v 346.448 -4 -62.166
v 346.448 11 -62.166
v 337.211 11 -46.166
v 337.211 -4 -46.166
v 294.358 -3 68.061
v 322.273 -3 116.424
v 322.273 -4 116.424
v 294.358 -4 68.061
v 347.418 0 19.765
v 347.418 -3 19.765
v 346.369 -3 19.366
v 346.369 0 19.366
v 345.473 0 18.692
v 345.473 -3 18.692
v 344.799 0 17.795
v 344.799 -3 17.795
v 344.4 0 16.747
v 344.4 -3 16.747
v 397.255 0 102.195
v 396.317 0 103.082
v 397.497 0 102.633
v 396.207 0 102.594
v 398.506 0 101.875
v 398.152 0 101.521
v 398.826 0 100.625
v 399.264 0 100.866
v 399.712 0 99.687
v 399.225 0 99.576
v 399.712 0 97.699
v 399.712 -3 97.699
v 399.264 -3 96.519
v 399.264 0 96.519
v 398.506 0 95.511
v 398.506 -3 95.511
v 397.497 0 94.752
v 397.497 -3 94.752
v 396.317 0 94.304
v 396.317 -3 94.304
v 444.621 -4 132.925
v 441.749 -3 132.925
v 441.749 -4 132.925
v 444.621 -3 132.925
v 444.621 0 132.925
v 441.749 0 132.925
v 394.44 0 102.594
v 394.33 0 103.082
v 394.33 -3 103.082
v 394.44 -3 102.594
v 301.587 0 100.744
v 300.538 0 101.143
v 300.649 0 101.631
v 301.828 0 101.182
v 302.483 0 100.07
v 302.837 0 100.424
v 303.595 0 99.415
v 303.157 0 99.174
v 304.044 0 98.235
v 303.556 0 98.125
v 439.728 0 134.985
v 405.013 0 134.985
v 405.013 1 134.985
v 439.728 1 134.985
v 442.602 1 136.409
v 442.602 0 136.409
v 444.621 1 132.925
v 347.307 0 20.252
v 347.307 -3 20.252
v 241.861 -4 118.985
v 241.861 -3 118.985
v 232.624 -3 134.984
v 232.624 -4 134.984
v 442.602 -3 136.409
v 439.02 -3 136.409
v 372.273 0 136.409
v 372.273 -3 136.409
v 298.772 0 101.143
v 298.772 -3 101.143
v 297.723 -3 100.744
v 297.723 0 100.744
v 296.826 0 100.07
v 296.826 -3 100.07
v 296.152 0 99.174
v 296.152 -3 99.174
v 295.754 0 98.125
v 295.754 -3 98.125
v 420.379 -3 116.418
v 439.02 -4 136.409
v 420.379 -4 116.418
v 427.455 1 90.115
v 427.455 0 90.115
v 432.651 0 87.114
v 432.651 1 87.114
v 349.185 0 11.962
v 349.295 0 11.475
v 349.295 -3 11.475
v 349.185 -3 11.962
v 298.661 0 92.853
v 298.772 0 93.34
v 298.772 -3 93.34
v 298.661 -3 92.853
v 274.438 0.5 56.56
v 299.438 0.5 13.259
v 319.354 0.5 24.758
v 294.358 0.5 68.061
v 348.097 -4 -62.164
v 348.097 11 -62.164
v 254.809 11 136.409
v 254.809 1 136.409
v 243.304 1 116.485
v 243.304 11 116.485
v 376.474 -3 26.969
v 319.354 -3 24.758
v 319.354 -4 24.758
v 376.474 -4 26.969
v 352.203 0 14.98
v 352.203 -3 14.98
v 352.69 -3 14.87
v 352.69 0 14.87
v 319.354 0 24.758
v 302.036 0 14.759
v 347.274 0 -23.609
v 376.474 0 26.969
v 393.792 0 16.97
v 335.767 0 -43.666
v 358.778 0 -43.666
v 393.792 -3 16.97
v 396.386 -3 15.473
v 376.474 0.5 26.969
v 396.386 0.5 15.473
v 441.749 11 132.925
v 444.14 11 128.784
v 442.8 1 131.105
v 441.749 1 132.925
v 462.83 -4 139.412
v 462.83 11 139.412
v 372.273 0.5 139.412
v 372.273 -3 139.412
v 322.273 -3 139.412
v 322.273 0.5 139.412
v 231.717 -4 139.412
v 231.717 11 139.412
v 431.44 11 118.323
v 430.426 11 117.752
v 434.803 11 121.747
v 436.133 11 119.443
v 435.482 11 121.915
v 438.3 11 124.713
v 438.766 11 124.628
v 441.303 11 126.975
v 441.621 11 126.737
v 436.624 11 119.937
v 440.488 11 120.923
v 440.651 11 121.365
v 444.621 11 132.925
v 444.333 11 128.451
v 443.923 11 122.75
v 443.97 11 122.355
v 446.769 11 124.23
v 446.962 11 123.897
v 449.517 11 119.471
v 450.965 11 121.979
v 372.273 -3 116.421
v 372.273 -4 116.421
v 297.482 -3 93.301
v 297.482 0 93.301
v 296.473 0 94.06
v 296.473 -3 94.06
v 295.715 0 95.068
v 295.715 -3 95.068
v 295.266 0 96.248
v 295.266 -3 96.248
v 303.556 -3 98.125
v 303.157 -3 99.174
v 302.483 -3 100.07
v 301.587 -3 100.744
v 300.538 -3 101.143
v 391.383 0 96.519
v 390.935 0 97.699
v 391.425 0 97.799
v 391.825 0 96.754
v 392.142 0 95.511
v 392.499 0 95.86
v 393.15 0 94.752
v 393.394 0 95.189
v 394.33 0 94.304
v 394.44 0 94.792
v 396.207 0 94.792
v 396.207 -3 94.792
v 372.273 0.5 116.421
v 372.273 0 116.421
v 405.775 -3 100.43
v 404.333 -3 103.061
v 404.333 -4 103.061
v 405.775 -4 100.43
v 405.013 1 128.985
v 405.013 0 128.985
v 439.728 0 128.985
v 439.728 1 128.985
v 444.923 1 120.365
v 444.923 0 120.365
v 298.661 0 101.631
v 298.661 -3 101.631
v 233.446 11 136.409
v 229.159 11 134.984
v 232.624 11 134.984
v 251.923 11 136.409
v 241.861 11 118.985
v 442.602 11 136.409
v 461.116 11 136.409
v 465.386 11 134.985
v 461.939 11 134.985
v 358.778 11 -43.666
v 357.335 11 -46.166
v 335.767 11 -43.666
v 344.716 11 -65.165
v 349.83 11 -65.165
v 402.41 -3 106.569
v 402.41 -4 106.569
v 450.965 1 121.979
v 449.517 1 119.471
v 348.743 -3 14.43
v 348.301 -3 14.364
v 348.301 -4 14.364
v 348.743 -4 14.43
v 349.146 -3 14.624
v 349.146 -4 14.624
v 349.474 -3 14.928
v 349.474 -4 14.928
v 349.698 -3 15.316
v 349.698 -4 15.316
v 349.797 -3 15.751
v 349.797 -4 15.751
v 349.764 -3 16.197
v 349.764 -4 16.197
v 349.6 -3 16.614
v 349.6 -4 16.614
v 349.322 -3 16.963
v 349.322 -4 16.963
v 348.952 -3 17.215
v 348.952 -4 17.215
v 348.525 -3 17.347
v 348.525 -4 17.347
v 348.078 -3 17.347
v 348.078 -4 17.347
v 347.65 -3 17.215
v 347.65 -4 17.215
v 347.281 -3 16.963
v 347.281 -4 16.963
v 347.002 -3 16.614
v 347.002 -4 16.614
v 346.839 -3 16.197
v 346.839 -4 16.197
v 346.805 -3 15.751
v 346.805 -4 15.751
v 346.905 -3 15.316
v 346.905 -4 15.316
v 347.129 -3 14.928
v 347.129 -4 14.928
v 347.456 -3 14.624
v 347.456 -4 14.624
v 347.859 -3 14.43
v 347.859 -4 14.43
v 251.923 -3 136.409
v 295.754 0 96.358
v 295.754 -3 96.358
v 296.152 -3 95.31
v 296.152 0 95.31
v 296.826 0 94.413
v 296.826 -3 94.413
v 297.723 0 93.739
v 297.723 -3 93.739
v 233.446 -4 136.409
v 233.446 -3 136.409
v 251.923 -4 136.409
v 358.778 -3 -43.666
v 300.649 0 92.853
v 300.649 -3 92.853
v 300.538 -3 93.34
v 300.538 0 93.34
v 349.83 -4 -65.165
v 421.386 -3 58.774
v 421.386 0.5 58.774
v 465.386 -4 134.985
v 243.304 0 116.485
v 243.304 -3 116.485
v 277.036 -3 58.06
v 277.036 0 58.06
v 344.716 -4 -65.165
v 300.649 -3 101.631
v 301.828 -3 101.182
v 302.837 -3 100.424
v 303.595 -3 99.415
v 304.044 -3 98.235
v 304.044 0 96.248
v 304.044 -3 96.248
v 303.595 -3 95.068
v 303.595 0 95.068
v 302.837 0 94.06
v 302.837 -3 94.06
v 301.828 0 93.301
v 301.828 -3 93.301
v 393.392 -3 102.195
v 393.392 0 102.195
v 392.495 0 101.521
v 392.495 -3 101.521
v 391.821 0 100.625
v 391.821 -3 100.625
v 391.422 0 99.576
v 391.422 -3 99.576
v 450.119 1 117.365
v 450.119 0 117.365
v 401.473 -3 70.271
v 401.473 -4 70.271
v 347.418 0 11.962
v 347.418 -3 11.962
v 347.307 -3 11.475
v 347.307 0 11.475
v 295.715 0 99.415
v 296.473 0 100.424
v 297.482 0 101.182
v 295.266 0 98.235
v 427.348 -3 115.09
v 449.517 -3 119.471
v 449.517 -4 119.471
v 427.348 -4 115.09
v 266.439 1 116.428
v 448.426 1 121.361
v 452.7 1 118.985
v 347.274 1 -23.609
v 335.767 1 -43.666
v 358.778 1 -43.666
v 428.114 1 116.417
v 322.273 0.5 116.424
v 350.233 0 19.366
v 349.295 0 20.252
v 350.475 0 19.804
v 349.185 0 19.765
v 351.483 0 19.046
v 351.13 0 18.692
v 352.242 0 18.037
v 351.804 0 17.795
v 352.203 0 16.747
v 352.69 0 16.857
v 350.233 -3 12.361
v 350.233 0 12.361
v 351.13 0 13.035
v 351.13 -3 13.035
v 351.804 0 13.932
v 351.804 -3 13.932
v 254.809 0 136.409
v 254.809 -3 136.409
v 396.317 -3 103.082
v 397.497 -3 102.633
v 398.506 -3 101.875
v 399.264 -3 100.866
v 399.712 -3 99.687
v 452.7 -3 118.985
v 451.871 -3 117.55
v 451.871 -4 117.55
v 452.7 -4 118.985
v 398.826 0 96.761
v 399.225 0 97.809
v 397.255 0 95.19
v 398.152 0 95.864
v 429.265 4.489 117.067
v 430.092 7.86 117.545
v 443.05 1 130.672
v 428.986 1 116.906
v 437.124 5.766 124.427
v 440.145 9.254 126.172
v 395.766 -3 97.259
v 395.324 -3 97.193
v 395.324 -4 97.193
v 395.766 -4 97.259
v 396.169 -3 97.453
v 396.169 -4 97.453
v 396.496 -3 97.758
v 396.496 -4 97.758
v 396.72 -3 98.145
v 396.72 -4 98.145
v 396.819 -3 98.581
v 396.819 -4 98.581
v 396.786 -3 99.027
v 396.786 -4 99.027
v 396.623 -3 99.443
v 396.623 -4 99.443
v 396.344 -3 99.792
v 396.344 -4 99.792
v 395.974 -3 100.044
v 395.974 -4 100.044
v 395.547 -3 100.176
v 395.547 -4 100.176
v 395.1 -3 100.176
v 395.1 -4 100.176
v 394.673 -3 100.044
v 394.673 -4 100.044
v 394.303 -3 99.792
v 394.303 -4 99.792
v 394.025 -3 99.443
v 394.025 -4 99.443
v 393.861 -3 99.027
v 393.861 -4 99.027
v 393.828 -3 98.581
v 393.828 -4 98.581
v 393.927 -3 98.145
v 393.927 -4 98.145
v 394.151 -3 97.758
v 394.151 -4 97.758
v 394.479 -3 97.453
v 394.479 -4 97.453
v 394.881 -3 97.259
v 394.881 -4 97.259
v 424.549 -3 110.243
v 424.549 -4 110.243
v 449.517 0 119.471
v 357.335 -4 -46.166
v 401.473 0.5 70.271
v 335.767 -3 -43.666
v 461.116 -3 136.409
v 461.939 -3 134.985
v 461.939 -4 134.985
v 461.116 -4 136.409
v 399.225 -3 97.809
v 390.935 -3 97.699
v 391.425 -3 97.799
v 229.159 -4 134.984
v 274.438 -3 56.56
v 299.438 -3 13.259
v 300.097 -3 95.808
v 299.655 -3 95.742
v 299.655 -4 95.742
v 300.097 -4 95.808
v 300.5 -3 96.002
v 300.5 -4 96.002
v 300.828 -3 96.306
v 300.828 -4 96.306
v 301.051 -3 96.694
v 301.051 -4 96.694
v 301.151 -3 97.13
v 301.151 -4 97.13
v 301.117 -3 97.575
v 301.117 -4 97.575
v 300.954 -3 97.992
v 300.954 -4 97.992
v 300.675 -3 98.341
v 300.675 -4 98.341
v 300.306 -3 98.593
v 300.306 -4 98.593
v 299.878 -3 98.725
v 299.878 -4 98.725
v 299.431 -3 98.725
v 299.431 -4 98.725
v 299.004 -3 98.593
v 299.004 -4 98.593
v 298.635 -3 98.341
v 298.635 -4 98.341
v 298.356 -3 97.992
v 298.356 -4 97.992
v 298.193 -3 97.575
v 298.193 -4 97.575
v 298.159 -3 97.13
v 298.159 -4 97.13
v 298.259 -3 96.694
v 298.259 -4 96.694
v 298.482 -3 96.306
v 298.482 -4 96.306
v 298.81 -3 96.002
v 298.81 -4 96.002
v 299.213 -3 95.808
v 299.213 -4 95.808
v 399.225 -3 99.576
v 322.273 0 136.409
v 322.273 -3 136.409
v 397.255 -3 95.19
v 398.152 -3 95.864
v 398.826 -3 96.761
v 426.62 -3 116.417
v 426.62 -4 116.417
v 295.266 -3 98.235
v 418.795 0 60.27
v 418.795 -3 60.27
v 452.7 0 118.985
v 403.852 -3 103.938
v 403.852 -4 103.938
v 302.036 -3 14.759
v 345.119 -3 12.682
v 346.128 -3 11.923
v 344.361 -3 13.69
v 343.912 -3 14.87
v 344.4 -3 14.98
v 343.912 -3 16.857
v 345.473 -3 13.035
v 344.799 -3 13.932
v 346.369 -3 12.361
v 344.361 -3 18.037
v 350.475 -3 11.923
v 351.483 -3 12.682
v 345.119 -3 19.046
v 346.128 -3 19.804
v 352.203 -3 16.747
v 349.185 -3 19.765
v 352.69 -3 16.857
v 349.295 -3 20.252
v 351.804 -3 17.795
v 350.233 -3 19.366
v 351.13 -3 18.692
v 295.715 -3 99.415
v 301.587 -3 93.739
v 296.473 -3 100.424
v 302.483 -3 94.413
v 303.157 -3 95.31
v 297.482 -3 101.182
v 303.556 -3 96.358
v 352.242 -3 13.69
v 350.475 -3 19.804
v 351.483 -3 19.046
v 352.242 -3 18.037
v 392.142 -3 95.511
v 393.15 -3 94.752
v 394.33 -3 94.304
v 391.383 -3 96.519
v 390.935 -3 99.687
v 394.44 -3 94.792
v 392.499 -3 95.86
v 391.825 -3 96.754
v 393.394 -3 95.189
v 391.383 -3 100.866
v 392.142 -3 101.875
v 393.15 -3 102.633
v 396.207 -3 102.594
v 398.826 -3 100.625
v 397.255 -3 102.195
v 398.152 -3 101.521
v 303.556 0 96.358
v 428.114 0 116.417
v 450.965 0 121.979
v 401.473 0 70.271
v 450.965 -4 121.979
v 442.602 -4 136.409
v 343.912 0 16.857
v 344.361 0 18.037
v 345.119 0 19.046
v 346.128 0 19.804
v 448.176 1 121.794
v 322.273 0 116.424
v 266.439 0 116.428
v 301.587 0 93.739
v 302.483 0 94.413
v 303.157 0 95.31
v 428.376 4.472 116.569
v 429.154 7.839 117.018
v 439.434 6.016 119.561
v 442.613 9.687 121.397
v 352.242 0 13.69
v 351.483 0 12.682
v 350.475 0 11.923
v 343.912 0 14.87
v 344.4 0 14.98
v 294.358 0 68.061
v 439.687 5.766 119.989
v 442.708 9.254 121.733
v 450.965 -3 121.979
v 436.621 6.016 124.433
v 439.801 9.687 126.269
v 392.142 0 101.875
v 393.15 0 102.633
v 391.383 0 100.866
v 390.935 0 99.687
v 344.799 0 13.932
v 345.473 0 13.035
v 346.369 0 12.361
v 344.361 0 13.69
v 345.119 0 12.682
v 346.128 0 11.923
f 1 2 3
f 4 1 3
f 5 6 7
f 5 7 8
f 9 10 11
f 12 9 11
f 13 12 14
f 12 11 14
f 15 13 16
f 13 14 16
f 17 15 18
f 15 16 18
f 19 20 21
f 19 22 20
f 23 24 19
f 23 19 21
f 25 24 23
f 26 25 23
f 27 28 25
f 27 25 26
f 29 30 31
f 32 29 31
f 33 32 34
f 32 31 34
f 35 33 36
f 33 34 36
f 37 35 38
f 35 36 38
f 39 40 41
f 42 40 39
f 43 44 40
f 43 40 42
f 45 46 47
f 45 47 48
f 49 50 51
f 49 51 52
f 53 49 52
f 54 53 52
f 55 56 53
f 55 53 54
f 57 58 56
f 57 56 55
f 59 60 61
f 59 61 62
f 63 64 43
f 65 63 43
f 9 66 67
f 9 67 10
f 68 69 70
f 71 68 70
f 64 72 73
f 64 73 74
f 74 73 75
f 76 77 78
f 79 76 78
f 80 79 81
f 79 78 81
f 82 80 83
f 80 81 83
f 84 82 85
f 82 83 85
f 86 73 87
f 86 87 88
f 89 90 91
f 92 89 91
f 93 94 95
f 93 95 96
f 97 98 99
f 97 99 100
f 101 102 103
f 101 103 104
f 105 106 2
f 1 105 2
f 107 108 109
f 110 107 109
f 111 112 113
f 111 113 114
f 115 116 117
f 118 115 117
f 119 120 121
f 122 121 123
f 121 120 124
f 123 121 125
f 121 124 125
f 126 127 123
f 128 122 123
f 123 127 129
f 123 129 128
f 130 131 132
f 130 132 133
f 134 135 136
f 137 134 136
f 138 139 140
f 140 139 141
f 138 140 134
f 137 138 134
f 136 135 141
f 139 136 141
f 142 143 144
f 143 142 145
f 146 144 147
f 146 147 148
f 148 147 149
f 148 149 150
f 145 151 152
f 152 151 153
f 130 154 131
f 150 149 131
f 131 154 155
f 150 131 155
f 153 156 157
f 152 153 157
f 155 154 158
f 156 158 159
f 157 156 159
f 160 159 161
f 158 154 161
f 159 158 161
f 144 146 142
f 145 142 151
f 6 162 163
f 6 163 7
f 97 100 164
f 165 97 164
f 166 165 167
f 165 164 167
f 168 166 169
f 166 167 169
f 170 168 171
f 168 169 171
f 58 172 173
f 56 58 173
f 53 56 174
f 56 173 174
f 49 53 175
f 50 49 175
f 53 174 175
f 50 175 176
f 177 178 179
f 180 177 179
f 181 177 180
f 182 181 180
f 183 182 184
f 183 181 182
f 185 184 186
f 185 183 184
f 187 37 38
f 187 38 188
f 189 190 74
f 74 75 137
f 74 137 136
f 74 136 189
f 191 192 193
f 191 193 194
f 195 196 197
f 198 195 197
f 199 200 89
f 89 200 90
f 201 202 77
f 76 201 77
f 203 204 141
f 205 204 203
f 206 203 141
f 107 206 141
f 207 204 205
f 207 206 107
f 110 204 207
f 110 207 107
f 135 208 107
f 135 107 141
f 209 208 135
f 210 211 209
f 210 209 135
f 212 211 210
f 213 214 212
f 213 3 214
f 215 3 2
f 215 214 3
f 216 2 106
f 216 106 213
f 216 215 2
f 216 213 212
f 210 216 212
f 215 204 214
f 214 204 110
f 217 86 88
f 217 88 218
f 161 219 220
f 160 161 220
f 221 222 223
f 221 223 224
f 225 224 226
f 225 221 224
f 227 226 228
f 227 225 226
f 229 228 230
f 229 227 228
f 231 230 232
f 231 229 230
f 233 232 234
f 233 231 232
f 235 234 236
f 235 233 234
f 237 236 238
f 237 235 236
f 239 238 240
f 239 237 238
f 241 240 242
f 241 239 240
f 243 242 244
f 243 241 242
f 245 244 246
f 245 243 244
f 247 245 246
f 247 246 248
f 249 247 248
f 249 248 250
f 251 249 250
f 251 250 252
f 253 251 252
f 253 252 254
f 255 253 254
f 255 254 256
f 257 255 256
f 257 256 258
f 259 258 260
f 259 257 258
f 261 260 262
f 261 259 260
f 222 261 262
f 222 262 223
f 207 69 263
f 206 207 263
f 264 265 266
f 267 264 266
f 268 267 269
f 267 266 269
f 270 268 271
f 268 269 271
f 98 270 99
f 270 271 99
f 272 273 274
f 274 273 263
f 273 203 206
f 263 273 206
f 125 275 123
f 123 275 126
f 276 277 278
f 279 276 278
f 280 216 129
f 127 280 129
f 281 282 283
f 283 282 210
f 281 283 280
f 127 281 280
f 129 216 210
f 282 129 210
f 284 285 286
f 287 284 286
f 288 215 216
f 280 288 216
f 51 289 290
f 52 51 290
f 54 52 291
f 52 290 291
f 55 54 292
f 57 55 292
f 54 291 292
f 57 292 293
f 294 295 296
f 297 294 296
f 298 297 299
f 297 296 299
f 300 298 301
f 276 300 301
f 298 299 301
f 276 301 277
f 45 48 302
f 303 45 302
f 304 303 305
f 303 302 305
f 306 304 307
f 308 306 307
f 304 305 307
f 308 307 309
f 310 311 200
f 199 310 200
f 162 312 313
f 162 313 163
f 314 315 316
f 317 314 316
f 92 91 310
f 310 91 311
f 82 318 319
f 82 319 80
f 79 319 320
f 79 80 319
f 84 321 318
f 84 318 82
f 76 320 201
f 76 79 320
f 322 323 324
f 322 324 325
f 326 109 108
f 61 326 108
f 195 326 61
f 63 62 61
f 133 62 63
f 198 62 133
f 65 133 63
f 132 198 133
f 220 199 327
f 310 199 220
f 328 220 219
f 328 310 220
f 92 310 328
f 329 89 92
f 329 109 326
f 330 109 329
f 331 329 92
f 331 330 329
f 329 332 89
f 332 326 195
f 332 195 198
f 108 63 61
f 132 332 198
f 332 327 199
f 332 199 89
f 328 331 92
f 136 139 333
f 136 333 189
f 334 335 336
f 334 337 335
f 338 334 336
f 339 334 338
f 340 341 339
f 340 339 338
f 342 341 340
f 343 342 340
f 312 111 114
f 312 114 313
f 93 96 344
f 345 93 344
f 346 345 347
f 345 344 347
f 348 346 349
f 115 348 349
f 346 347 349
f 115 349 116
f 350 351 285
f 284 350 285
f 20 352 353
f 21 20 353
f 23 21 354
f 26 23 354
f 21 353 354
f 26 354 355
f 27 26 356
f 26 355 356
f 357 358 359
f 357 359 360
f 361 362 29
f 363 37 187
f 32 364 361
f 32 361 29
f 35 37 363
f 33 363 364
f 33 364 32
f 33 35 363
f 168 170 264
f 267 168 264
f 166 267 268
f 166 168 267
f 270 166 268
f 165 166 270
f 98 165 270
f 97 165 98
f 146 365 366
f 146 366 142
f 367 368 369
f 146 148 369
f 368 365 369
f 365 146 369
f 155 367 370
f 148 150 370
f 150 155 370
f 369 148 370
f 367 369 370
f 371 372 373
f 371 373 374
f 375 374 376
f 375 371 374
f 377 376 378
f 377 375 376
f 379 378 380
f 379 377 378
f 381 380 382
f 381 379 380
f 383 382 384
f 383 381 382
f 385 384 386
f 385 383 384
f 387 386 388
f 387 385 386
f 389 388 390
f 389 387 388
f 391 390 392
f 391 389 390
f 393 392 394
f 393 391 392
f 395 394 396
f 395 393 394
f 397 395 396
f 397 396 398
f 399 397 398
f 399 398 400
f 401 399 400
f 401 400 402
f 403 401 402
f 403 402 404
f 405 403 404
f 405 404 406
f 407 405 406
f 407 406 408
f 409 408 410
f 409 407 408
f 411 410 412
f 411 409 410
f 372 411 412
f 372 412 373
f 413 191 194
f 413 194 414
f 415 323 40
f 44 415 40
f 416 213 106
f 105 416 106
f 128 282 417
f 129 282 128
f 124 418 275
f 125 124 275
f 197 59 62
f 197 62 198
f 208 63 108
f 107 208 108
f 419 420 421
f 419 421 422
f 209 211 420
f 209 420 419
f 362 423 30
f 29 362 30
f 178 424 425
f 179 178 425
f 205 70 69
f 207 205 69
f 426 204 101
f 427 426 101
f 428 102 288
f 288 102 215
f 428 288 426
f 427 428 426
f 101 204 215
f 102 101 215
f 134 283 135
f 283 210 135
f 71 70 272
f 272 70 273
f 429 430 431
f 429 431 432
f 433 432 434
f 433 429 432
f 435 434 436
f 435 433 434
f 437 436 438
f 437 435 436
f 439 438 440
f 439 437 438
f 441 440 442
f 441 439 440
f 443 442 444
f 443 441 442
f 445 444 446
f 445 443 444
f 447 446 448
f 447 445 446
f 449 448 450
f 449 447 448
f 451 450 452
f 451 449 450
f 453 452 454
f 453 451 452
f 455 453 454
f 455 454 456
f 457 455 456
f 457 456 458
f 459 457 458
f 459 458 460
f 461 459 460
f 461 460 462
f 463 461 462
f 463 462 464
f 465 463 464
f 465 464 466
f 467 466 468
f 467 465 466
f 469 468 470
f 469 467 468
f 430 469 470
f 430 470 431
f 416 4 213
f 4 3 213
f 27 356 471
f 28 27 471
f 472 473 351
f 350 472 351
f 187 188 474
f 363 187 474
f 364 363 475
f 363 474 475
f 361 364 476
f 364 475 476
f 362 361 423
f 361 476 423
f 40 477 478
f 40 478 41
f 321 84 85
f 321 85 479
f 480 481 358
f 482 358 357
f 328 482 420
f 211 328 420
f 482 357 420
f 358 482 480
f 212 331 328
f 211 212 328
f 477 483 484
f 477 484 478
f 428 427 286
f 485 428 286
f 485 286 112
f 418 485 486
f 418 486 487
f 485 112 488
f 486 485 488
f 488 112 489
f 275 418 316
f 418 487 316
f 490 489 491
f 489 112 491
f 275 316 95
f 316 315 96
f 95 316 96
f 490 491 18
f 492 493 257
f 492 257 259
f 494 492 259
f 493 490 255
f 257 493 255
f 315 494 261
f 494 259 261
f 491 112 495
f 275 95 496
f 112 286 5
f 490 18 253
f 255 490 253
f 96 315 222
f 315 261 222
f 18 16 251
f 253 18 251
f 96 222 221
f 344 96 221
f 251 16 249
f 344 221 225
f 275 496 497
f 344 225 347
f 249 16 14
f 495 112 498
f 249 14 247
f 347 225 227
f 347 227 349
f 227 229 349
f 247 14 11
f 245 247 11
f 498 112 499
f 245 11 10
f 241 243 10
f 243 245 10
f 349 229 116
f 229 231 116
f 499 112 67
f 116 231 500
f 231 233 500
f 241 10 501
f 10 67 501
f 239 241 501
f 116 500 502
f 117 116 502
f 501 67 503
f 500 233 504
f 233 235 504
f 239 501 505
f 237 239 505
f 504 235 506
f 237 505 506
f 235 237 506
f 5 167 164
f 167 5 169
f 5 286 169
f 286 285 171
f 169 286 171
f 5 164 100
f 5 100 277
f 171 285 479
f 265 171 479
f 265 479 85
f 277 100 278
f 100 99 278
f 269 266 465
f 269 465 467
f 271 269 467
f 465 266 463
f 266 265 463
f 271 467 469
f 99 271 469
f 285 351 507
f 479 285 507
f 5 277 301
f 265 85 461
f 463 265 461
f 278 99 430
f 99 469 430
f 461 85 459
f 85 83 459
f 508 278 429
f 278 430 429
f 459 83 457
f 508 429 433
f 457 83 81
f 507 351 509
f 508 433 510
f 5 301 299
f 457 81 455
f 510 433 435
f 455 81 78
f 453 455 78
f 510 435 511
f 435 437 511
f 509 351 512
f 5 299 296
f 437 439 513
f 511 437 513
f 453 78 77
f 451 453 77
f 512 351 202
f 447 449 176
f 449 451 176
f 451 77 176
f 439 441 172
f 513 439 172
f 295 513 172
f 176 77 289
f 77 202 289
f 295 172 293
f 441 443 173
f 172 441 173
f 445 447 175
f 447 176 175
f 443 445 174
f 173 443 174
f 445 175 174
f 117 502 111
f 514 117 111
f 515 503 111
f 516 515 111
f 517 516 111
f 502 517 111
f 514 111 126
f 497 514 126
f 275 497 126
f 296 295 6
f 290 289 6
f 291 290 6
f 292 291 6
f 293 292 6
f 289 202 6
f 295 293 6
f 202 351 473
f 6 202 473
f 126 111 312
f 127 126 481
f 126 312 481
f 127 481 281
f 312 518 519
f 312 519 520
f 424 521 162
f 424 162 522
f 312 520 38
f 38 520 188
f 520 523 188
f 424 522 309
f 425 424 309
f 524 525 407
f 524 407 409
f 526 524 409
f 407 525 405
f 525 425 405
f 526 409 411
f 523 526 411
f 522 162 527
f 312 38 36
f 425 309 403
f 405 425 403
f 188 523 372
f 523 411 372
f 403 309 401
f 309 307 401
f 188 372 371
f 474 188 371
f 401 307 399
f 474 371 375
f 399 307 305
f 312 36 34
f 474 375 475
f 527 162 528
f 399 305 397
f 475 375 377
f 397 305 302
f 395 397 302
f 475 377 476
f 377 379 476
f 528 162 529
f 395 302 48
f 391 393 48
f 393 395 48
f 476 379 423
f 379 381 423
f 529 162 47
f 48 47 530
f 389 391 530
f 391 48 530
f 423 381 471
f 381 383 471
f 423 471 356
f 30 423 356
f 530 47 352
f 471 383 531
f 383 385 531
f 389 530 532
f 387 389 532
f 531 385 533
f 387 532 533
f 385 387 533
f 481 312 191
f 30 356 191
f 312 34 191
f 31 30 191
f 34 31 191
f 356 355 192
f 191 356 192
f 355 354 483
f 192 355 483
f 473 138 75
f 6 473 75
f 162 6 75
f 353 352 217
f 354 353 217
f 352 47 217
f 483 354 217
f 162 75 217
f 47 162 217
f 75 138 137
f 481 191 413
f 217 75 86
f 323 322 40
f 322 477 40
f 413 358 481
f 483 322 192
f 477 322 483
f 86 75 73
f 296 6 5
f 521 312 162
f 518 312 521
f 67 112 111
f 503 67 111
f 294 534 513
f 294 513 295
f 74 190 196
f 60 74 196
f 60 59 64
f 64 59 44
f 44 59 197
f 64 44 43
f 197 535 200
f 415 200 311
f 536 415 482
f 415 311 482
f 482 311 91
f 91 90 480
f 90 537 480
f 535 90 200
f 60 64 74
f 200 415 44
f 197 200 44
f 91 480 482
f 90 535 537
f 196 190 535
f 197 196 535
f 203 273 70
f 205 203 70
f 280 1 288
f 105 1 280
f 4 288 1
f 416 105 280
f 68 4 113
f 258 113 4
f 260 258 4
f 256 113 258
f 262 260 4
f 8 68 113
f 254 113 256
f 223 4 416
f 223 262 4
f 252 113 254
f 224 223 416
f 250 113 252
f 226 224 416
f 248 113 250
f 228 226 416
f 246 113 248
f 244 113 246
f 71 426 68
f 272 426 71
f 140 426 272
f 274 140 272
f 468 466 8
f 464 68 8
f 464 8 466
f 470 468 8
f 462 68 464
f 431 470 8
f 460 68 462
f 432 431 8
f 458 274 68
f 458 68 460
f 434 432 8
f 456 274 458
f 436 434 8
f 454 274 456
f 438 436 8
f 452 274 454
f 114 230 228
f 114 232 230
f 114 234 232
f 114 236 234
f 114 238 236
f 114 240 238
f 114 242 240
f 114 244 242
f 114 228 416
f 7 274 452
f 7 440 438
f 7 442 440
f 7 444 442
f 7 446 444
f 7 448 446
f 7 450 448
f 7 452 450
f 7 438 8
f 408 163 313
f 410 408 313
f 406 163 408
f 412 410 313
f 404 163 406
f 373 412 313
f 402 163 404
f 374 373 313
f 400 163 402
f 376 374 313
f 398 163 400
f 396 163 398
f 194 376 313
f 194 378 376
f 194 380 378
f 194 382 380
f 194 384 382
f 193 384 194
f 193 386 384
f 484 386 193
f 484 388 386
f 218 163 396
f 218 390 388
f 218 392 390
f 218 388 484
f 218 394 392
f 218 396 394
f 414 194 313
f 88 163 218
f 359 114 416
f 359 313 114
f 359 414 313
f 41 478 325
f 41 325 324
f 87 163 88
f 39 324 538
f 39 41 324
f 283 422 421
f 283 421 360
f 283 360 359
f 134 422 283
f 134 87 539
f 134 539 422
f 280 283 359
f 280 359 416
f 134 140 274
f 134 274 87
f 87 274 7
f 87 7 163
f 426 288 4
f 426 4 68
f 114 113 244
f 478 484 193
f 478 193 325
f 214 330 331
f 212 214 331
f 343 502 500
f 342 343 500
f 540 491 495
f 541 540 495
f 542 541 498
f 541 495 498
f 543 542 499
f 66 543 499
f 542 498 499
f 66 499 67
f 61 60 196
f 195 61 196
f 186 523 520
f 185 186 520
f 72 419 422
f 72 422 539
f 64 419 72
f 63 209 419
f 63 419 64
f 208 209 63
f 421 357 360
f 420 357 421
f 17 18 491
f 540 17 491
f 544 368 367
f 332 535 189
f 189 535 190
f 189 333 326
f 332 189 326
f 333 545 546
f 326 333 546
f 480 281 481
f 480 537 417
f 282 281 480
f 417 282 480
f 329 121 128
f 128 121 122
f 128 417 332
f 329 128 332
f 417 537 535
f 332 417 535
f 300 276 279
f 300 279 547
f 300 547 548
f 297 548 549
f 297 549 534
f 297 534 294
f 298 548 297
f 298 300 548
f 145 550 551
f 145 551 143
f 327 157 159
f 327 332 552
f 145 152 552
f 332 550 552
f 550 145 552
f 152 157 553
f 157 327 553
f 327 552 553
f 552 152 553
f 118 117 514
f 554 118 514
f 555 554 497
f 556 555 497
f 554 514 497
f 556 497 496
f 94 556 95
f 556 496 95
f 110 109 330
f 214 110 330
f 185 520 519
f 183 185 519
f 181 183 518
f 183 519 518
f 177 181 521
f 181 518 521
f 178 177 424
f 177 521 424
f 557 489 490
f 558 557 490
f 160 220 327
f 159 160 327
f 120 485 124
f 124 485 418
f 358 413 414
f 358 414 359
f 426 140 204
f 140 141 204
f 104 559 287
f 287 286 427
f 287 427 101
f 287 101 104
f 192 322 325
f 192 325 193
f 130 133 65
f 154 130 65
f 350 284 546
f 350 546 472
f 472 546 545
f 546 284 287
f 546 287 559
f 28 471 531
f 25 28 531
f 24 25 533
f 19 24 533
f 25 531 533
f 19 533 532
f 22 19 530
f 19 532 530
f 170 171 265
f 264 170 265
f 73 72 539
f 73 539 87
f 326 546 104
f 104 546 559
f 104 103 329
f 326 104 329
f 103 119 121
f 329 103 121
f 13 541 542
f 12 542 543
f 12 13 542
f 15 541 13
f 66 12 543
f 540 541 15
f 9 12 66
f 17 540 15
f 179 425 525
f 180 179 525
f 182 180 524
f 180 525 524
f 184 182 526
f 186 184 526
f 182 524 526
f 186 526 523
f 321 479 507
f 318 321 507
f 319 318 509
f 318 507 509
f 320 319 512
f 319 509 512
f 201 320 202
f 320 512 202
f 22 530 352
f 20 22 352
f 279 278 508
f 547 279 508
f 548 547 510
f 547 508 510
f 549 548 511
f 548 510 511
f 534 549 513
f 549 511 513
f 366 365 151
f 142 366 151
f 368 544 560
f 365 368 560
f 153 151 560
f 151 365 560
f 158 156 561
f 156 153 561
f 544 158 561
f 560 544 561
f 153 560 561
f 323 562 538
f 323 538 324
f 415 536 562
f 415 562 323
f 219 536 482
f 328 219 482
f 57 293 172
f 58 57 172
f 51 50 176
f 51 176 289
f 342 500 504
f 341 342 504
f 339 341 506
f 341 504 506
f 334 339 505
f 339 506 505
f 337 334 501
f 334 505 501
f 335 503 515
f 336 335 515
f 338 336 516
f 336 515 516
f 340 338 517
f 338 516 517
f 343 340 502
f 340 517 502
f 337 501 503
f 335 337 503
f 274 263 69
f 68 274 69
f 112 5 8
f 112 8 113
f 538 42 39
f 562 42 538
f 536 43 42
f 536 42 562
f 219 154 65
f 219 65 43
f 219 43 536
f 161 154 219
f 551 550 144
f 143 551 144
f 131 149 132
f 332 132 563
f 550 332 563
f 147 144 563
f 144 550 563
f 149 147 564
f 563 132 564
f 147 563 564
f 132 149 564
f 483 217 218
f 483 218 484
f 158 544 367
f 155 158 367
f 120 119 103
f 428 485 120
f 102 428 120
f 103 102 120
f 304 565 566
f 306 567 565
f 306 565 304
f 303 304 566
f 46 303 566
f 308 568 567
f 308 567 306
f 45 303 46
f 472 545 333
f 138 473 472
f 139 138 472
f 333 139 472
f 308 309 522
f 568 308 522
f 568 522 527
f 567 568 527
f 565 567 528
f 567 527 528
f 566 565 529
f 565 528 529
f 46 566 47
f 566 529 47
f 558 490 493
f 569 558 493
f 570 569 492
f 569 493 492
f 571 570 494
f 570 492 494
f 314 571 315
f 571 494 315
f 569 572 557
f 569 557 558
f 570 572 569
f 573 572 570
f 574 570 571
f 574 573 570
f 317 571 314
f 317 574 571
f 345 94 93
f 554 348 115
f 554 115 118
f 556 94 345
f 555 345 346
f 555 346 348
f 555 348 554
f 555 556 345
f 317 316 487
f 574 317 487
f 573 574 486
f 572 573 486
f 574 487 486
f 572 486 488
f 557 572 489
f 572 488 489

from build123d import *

# Parameters (mm, degrees)
SKETCH1_W                = 34.714871786
SKETCH1_H                = 6
BOSS_EXTRUDE1_DEPTH      = 1
BOSS_EXTRUDE2_DEPTH      = 11
BOSS_EXTRUDE3_DEPTH      = 5
BOSS_EXTRUDE3_DEPTH_BACK = 3
SKETCH3_W                = 50
SKETCH3_H                = 7
CUT_EXTRUDE3_DEPTH       = 25
SKETCH5_W                = 50
SKETCH5_H                = 7
CUT_EXTRUDE4_DEPTH       = 25
SKETCH6_W                = 50
SKETCH6_H                = 7
CUT_EXTRUDE5_DEPTH       = 25
SKETCH8_R                = 1.500000001
SKETCH8_R_2              = 1.499999999
BOSS_EXTRUDE5_DEPTH      = 1
BOSS_EXTRUDE10_DEPTH     = 3
REVOLVE1_ANGLE           = 90
SKETCH15_W               = 7.87412369
SKETCH15_H               = 12.308031651
CUT_EXTRUDE7_DEPTH       = 38


with BuildPart() as part:
    # Sketch1 → Boss-Extrude1 (new body)
    with BuildSketch(Plane(origin=(0, 0, 0), x_dir=(1, 0, 0), z_dir=(0, 1, 0))):
        Polygon((243.304219779, -116.484791863), (254.809280582, -136.408896135), (442.60209075, -136.409305398), (444.621046679, -132.925433226), (441.749040748, -132.925433226), (449.516726724, -119.47140646), (450.964695301, -121.978953126), (452.699916625, -118.984688022), (358.778179038, 43.666038061), (335.767496282, 43.666038061), align=None)
        with Locations((422.370878913, -131.984588005)):
            Rectangle(SKETCH1_W, SKETCH1_H, mode=Mode.SUBTRACT)
        Polygon((450.119365975, -117.364996826), (444.923425166, -120.365363323), (427.455346217, -90.114690822), (432.651287025, -87.114324326), align=None, mode=Mode.SUBTRACT)
        Polygon((428.11367092, -116.417164682), (266.43910827, -116.428009228), (347.273609731, 23.609230811), align=None, mode=Mode.SUBTRACT)
    extrude(amount=BOSS_EXTRUDE1_DEPTH)

    # Sketch1<9> → Boss-Extrude2 (add)
    # profile 1 of 2: a face of its own
    with BuildSketch(Plane(origin=(0, 0, 0), x_dir=(1, 0, 0), z_dir=(0, 1, 0))):
        Polygon((229.15943255, -134.984249185), (231.716666588, -139.412373829), (462.829865412, -139.412373829), (465.38624875, -134.984588004), (349.829542096, 65.165499075), (344.716133219, 65.165499075), align=None)
        Polygon((251.922647994, -136.409305396), (233.446303405, -136.408896135), (232.623553965, -134.984217354), (241.860901694, -118.984688016), align=None, mode=Mode.SUBTRACT)
        Polygon((442.60209075, -136.409305398), (254.809280582, -136.408896135), (243.304219779, -116.484791863), (335.767496282, 43.666038061), (358.778179038, 43.666038061), (461.938967961, -134.98458801), (461.116393749, -136.409305398), align=None, mode=Mode.SUBTRACT)
        Polygon((348.096628302, 62.164013367), (357.334800991, 46.166038067), (337.210874326, 46.166038067), (346.44844193, 62.165948237), align=None, mode=Mode.SUBTRACT)
    # profile 2 of 2: a face of its own
    with BuildSketch(Plane(origin=(0, 0, 0), x_dir=(1, 0, 0), z_dir=(0, 1, 0))):
        Polygon((441.749040748, -132.925433226), (444.621046679, -132.925433226), (450.964695301, -121.978953126), (449.516726724, -119.47140646), align=None)
    extrude(amount=BOSS_EXTRUDE2_DEPTH)

    # Sketch1<10> → Boss-Extrude3 (add, two sides: drawn at the far end of the back side and taken through both)
    # profile 1 of 2: a face of its own
    with BuildSketch(Plane(origin=(0, 0, 0), x_dir=(1, 0, 0), z_dir=(0, 1, 0)).offset(-BOSS_EXTRUDE3_DEPTH_BACK)):
        Polygon((229.15943255, -134.984249185), (231.716666588, -139.412373829), (462.829865412, -139.412373829), (465.38624875, -134.984588004), (349.829542096, 65.165499075), (344.716133219, 65.165499075), align=None)
        Polygon((251.922647994, -136.409305396), (233.446303405, -136.408896135), (232.623553965, -134.984217354), (241.860901694, -118.984688016), align=None, mode=Mode.SUBTRACT)
        Polygon((442.60209075, -136.409305398), (254.809280582, -136.408896135), (243.304219779, -116.484791863), (335.767496282, 43.666038061), (358.778179038, 43.666038061), (461.938967961, -134.98458801), (461.116393749, -136.409305398), align=None, mode=Mode.SUBTRACT)
        Polygon((348.096628302, 62.164013367), (357.334800991, 46.166038067), (337.210874326, 46.166038067), (346.44844193, 62.165948237), align=None, mode=Mode.SUBTRACT)
    # profile 2 of 2: a face of its own
    with BuildSketch(Plane(origin=(0, 0, 0), x_dir=(1, 0, 0), z_dir=(0, 1, 0)).offset(-BOSS_EXTRUDE3_DEPTH_BACK)):
        Polygon((441.749040748, -132.925433226), (444.621046679, -132.925433226), (450.964695301, -121.978953126), (449.516726724, -119.47140646), align=None)
    extrude(amount=BOSS_EXTRUDE3_DEPTH + BOSS_EXTRUDE3_DEPTH_BACK)

    # Sketch3 → Cut-Extrude3 (cut)
    with BuildSketch(Plane(origin=(290.589645397, 0, -167.772009994), x_dir=(-0.49999999999998745, 0, -0.8660254037844459), z_dir=(0.8660254037844459, 0, -0.49999999999998745))):
        with Locations((-236.592990632, -3)):
            Rectangle(SKETCH3_W, SKETCH3_H)
    extrude(amount=-CUT_EXTRUDE3_DEPTH, mode=Mode.SUBTRACT)

    # Sketch5 → Cut-Extrude4 (cut)
    with BuildSketch(Plane.XY.offset(139.412373829)):
        with Locations((347.273266, -3)):
            Rectangle(SKETCH5_W, SKETCH5_H)
    extrude(amount=-CUT_EXTRUDE4_DEPTH, mode=Mode.SUBTRACT)

    # Sketch6 → Cut-Extrude5 (cut)
    with BuildSketch(Plane(origin=(230.319375802, 0, 132.975171836), x_dir=(-0.5000006153901599, 0, 0.8660250484884727), z_dir=(-0.8660250484884727, 0, -0.5000006153901599))):
        with Locations((-113.236674797, -3)):
            Rectangle(SKETCH6_W, SKETCH6_H)
    extrude(amount=-CUT_EXTRUDE5_DEPTH, mode=Mode.SUBTRACT)

    # Sketch8 → Boss-Extrude5 (add)
    with BuildSketch(Plane.XZ.offset(3)):
        Polygon((349.829542096, -65.165499075), (465.38624875, 134.984588004), (462.829865412, 139.412373829), (231.716666588, 139.412373829), (229.15943255, 134.984249185), (344.716133219, -65.165499075), align=None)
        with Locations((395.323540807, 98.692824233)):
            Circle(SKETCH8_R, mode=Mode.SUBTRACT)
        with Locations((348.301285092, 15.86352663)):
            Circle(SKETCH8_R_2, mode=Mode.SUBTRACT)
        with Locations((299.654911442, 97.241681778)):
            Circle(SKETCH8_R, mode=Mode.SUBTRACT)
        Polygon((444.621046678, 132.925433226), (450.9646953, 121.978953126), (449.516726723, 119.47140646), (427.347592194, 115.090208206), (404.332986149, 103.060878104), (405.774939108, 100.430142149), (424.549299543, 110.243170392), (451.871255231, 117.549638152), (452.699916625, 118.984688022), (461.93896796, 134.98458801), (461.116393748, 136.409305398), (442.602090749, 136.409305398), (439.019602541, 136.409297591), (420.379437569, 116.417683466), (402.410382204, 106.568526043), (403.852335163, 103.937790089), (426.620208945, 116.417264858), (441.749040748, 132.925433226), align=None, mode=Mode.SUBTRACT)
        Polygon((322.273266, 116.424264074), (294.35821863, 68.061097963), (319.354499369, 24.757680454), (376.473657314, 26.969372807), (401.472679509, 70.271207532), (372.273266, 116.420910254), align=None, mode=Mode.SUBTRACT)
        Polygon((233.446303405, 136.408896135), (251.922647993, 136.409305396), (241.860901693, 118.984688015), (232.623553964, 134.984217354), align=None, mode=Mode.SUBTRACT)
        Polygon((337.210874326, -46.166038067), (357.334800991, -46.166038067), (348.096628302, -62.164013367), (346.44844193, -62.165948237), align=None, mode=Mode.SUBTRACT)
    extrude(amount=BOSS_EXTRUDE5_DEPTH)

    # Sketch12 → Boss-Extrude10 (add)
    with BuildSketch(Plane(origin=(0, -3, 0), x_dir=(1, 0, 0), z_dir=(0, 1, 0))):
        with BuildLine():
            ThreePointArc((352.690173981, -14.86971864), (351.483265607, -12.681546115), (349.295093082, -11.474637741))
            Line((349.295093082, -11.474637742), (349.184669972, -11.962292063))
            ThreePointArc((349.184669972, -11.962292062), (351.129712217, -13.035099505), (352.20251966, -14.98014175))
            Line((352.20251966, -14.98014175), (352.690173981, -14.86971864))
        make_face()
        with BuildLine():
            Line((347.417900212, -11.962292063), (347.307477102, -11.474637742))
            ThreePointArc((347.307477102, -11.474637741), (345.119304576, -12.681546115), (343.912396203, -14.86971864))
            Line((343.912396203, -14.86971864), (344.400050524, -14.98014175))
            ThreePointArc((344.400050524, -14.98014175), (345.472857967, -13.035099505), (347.417900212, -11.962292062))
        make_face()
        with BuildLine():
            ThreePointArc((349.295093082, -20.25241552), (351.483265607, -19.045507146), (352.690173981, -16.85733462))
            Line((352.690173981, -16.85733462), (352.20251966, -16.74691151))
            ThreePointArc((352.20251966, -16.74691151), (351.129712217, -18.691953755), (349.184669972, -19.764761199))
            Line((349.184669972, -19.764761198), (349.295093082, -20.252415519))
        make_face()
        with BuildLine():
            Line((344.400050524, -16.74691151), (343.912396203, -16.85733462))
            ThreePointArc((343.912396203, -16.85733462), (345.119304576, -19.045507146), (347.307477102, -20.25241552))
            Line((347.307477102, -20.252415519), (347.417900212, -19.764761198))
            ThreePointArc((347.417900212, -19.764761199), (345.472857967, -18.691953755), (344.400050524, -16.74691151))
        make_face()
        with BuildLine():
            Line((394.440155927, -94.791589665), (394.329732817, -94.303935344))
            ThreePointArc((394.329732817, -94.303935343), (392.141560291, -95.510843717), (390.934651917, -97.699016243))
            Line((390.934651918, -97.699016243), (391.424789599, -97.798542944))
            ThreePointArc((391.424789599, -97.798542944), (392.499067688, -95.860448621), (394.440155927, -94.791589664))
        make_face()
        with BuildLine():
            ThreePointArc((399.712429696, -97.699016243), (398.505521322, -95.510843717), (396.317348797, -94.303935343))
            Line((396.317348797, -94.303935344), (396.206925687, -94.791589665))
            ThreePointArc((396.206925687, -94.791589664), (398.151967932, -95.864397108), (399.224775375, -97.809439353))
            Line((399.224775375, -97.809439353), (399.712429695, -97.699016243))
        make_face()
        with BuildLine():
            Line((391.422306239, -99.576209113), (390.934651918, -99.686632223))
            ThreePointArc((390.934651917, -99.686632223), (392.141560291, -101.874804748), (394.329732817, -103.081713122))
            Line((394.329732817, -103.081713121), (394.440155927, -102.5940588))
            ThreePointArc((394.440155927, -102.594058801), (392.495113682, -101.521251358), (391.422306238, -99.576209113))
        make_face()
        with BuildLine():
            ThreePointArc((396.317348797, -103.081713122), (398.505521322, -101.874804748), (399.712429696, -99.686632223))
            Line((399.712429695, -99.686632223), (399.224775375, -99.576209113))
            ThreePointArc((399.224775375, -99.576209113), (398.151967932, -101.521251358), (396.206925687, -102.594058801))
            Line((396.206925687, -102.5940588), (396.317348797, -103.081713121))
        make_face()
        with BuildLine():
            ThreePointArc((298.661103452, -92.85279289), (296.472930928, -94.059701263), (295.266022554, -96.247873788))
            Line((295.266022553, -96.247873788), (295.753676874, -96.358296898))
            ThreePointArc((295.753676875, -96.358296898), (296.826484318, -94.413254654), (298.771526562, -93.340447211))
            Line((298.771526562, -93.34044721), (298.661103452, -92.852792889))
        make_face()
        with BuildLine():
            Line((295.753676874, -98.125066658), (295.266022553, -98.235489768))
            ThreePointArc((295.266022554, -98.235489767), (296.472930928, -100.423662292), (298.661103452, -101.630570665))
            Line((298.661103452, -101.630570666), (298.771526562, -101.142916345))
            ThreePointArc((298.771526562, -101.142916344), (296.826484318, -100.070108901), (295.753676875, -98.125066657))
        make_face()
        with BuildLine():
            ThreePointArc((304.04380033, -96.247873788), (302.836891957, -94.059701263), (300.648719432, -92.85279289))
            Line((300.648719432, -92.852792889), (300.538296322, -93.34044721))
            ThreePointArc((300.538296322, -93.340447211), (302.483338566, -94.413254654), (303.556146009, -96.358296898))
            Line((303.55614601, -96.358296898), (304.043800331, -96.247873788))
        make_face()
        with BuildLine():
            Line((300.538296322, -101.142916345), (300.648719432, -101.630570666))
            ThreePointArc((300.648719432, -101.630570665), (302.836891957, -100.423662292), (304.04380033, -98.235489767))
            Line((304.043800331, -98.235489768), (303.55614601, -98.125066658))
            ThreePointArc((303.556146009, -98.125066657), (302.483338566, -100.070108901), (300.538296322, -101.142916344))
        make_face()
    extrude(amount=BOSS_EXTRUDE10_DEPTH)

    # Sketch13 → Revolve1 (revolve)
    with BuildSketch(Plane(origin=(0, 1, 0), x_dir=(1, 0, 0), z_dir=(0, 1, 0))):
        Polygon((448.425771751, -121.360995899), (428.11367092, -116.417164681), (442.800303922, -131.104591996), (443.050303922, -130.671579294), (428.985837114, -116.90637438), (448.175771751, -121.794008601), align=None)
    revolve(axis=Axis((442.800303922, 1, 131.104591996), (0.5000000000000009, 0, -0.8660254037844383)), revolution_arc=REVOLVE1_ANGLE)

    # Sketch15 → Cut-Extrude7 (cut)
    with BuildSketch(Plane(origin=(388.870181552, 0, 224.514303999), x_dir=(0.5000000000000009, -5.733535551193207e-15, -0.8660254037844383), z_dir=(0.8660254037844382, -9.930774881669059e-15, 0.5000000000000008))):
        with Locations((114.477088338, 17.154015826)):
            Rectangle(SKETCH15_W, SKETCH15_H)
    extrude(amount=-CUT_EXTRUDE7_DEPTH, mode=Mode.SUBTRACT)


solid = part.part
